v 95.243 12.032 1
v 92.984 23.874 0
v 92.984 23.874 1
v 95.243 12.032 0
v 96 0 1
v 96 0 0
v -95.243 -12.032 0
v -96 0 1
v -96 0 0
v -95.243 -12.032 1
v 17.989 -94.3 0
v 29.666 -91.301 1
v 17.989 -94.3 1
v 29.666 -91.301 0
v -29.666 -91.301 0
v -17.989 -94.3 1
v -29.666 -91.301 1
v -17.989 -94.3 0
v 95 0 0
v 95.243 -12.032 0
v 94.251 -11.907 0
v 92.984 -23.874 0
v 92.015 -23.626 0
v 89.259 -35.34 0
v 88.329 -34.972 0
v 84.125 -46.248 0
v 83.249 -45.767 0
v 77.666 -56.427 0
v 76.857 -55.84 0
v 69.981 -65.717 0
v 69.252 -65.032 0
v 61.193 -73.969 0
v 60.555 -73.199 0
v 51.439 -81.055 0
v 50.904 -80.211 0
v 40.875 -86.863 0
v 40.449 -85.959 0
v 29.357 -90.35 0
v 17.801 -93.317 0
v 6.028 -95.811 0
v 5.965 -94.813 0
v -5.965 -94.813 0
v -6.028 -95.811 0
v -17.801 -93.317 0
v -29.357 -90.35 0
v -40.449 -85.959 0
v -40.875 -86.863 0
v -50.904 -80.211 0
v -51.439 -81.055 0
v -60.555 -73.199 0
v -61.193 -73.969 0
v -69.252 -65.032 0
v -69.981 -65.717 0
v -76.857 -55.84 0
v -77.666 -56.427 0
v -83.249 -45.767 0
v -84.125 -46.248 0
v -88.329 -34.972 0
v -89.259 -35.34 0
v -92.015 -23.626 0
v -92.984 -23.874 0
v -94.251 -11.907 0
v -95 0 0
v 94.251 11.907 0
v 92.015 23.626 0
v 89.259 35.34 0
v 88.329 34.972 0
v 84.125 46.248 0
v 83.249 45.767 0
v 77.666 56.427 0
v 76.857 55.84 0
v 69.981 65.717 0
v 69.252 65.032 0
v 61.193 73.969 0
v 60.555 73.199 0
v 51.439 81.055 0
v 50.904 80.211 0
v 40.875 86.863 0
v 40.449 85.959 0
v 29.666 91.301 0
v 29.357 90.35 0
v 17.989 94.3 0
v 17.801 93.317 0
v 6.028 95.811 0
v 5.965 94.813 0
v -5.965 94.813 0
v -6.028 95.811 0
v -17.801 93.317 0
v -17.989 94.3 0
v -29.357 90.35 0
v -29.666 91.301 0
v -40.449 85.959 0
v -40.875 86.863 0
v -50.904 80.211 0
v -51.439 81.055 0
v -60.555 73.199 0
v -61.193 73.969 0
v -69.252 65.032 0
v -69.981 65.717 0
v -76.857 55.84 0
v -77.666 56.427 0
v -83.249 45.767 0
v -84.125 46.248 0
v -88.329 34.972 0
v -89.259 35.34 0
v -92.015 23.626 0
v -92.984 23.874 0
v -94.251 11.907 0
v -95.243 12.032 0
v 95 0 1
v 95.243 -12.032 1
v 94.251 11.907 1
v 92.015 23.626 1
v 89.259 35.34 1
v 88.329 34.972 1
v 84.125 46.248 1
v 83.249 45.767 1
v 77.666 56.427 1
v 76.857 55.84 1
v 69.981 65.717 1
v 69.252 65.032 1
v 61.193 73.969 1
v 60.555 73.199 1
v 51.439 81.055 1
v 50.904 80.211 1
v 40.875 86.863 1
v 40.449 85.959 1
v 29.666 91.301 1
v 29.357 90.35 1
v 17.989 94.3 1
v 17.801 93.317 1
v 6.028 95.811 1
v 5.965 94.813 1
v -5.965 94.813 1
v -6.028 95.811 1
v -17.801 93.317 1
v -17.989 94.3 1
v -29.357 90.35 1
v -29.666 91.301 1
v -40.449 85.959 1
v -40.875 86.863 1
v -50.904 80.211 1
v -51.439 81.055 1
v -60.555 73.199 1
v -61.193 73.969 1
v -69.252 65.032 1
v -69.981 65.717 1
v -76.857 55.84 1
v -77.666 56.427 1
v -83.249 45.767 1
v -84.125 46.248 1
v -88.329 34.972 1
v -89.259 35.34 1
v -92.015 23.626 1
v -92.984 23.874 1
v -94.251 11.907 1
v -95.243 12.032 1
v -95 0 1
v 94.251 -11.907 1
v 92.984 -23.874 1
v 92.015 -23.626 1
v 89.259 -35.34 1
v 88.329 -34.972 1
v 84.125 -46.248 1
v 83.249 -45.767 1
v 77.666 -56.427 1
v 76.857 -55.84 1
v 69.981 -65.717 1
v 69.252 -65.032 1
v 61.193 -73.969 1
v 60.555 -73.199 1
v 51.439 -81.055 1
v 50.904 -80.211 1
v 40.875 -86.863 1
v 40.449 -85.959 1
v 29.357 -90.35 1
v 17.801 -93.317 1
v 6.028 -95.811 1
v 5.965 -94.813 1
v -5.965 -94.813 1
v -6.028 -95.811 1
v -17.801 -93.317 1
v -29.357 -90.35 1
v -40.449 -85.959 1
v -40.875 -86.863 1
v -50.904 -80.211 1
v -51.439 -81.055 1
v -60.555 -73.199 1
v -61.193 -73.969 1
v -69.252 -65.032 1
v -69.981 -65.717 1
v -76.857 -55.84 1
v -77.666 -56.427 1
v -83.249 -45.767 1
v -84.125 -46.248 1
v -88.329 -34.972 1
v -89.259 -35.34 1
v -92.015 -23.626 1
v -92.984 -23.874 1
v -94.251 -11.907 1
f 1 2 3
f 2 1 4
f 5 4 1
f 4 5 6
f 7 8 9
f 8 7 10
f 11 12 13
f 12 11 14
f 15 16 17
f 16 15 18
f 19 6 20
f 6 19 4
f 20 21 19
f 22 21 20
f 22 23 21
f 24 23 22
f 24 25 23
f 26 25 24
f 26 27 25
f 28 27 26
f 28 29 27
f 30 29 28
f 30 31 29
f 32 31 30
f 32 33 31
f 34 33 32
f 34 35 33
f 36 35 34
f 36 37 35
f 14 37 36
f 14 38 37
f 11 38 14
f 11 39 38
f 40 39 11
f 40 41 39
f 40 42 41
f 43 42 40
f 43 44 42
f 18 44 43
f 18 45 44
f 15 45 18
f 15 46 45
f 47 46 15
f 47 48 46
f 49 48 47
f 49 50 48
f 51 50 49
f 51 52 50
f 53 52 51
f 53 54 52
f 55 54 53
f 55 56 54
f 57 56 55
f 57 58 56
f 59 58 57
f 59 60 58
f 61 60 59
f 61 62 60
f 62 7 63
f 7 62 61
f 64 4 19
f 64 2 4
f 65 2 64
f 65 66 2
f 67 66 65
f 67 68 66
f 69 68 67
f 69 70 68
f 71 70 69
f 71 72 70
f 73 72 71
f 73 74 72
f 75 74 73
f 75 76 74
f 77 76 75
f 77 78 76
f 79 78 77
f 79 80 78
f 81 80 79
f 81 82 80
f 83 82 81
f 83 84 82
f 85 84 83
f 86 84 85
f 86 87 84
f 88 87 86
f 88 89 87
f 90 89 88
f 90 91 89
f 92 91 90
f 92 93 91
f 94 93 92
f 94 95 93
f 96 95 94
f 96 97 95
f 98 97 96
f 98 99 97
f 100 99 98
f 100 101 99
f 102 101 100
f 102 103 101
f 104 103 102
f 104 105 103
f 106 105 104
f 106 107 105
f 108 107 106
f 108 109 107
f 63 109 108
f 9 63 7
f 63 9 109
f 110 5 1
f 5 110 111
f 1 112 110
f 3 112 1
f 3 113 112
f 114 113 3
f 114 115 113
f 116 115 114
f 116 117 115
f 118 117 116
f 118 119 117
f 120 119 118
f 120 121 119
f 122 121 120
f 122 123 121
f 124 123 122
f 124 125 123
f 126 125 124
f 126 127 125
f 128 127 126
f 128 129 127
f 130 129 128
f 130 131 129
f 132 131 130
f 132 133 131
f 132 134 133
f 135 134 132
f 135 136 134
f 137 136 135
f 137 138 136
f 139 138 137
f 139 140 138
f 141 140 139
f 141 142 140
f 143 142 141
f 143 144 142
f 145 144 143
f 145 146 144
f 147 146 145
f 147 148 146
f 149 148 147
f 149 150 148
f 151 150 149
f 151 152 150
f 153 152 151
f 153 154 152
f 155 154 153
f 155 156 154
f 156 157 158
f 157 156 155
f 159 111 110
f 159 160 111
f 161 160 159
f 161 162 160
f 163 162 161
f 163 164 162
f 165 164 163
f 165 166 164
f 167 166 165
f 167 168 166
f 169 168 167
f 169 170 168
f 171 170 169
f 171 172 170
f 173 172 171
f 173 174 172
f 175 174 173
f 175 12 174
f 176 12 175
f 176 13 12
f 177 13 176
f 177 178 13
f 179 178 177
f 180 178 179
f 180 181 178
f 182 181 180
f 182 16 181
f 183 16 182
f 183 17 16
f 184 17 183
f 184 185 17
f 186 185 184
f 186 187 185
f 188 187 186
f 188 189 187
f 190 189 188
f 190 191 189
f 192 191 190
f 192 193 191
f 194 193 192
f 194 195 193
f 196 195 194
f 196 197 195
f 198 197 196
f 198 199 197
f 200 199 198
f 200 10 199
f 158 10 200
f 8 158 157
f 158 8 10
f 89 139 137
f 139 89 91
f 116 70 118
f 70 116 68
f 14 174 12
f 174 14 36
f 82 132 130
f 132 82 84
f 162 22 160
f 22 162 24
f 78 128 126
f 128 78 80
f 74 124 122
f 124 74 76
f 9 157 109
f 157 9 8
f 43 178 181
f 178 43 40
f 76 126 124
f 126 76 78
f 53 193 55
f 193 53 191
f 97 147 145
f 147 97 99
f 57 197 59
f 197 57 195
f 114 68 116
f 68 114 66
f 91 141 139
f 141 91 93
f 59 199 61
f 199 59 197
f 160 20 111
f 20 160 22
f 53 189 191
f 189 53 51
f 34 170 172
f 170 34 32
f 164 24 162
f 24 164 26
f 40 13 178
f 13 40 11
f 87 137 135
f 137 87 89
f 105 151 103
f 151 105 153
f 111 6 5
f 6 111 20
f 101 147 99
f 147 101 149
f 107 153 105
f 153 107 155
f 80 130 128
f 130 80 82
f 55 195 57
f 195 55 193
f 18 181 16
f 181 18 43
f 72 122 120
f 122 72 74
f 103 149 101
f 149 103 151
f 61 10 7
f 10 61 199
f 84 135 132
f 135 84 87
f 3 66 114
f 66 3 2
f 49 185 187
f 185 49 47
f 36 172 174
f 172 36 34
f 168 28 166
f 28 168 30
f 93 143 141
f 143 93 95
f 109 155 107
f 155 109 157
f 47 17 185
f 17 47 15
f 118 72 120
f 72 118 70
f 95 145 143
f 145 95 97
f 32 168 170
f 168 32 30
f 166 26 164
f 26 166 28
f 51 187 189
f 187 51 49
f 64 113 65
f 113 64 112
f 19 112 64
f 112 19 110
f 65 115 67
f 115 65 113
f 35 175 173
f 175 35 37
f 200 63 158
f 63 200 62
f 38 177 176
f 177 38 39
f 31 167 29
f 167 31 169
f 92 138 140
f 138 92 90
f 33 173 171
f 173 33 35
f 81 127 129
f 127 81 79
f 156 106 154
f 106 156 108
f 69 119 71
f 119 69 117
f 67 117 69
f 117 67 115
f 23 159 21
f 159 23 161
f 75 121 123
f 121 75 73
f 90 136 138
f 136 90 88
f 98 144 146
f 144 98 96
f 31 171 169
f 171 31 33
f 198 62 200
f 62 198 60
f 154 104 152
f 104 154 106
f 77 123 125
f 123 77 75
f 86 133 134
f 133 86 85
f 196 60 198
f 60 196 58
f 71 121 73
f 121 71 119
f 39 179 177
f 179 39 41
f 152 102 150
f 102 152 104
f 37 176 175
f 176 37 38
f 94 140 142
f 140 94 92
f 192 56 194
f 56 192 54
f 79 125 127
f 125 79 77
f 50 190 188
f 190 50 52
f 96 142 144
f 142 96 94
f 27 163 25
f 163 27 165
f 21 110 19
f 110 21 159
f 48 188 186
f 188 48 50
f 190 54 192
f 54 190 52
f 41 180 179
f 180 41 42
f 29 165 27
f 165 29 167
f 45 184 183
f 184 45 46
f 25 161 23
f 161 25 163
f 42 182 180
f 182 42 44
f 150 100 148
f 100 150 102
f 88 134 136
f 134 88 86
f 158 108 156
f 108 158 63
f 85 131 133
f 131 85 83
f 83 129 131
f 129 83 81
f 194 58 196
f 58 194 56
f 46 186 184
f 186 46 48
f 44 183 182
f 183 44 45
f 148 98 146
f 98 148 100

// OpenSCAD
// /********************************************************           
//  * Variable cicle for collision calibration             *   
//  *                                                      *   
//  * Author:  Adam, Kuczmik                               *   
//  *                                                      *   
//  * Purpose: For collision calibration of a delta 3d     *
//  * Printer (1 mm height)                                *   
//  *                                                      *   
//  * Usage:                                               *   
//  *      Run it in OpenSCAD version 2015.03-2            *   
//  ********************************************************/  
//
//
//
// Radius of the Ring [mm]
Radius= 96; 
 
 difference() {
    cylinder(h=1, r=Radius, center=false, $fn=50);
    cylinder(h=1, r=Radius-1, center=false, $fn=50);  
 }

 
